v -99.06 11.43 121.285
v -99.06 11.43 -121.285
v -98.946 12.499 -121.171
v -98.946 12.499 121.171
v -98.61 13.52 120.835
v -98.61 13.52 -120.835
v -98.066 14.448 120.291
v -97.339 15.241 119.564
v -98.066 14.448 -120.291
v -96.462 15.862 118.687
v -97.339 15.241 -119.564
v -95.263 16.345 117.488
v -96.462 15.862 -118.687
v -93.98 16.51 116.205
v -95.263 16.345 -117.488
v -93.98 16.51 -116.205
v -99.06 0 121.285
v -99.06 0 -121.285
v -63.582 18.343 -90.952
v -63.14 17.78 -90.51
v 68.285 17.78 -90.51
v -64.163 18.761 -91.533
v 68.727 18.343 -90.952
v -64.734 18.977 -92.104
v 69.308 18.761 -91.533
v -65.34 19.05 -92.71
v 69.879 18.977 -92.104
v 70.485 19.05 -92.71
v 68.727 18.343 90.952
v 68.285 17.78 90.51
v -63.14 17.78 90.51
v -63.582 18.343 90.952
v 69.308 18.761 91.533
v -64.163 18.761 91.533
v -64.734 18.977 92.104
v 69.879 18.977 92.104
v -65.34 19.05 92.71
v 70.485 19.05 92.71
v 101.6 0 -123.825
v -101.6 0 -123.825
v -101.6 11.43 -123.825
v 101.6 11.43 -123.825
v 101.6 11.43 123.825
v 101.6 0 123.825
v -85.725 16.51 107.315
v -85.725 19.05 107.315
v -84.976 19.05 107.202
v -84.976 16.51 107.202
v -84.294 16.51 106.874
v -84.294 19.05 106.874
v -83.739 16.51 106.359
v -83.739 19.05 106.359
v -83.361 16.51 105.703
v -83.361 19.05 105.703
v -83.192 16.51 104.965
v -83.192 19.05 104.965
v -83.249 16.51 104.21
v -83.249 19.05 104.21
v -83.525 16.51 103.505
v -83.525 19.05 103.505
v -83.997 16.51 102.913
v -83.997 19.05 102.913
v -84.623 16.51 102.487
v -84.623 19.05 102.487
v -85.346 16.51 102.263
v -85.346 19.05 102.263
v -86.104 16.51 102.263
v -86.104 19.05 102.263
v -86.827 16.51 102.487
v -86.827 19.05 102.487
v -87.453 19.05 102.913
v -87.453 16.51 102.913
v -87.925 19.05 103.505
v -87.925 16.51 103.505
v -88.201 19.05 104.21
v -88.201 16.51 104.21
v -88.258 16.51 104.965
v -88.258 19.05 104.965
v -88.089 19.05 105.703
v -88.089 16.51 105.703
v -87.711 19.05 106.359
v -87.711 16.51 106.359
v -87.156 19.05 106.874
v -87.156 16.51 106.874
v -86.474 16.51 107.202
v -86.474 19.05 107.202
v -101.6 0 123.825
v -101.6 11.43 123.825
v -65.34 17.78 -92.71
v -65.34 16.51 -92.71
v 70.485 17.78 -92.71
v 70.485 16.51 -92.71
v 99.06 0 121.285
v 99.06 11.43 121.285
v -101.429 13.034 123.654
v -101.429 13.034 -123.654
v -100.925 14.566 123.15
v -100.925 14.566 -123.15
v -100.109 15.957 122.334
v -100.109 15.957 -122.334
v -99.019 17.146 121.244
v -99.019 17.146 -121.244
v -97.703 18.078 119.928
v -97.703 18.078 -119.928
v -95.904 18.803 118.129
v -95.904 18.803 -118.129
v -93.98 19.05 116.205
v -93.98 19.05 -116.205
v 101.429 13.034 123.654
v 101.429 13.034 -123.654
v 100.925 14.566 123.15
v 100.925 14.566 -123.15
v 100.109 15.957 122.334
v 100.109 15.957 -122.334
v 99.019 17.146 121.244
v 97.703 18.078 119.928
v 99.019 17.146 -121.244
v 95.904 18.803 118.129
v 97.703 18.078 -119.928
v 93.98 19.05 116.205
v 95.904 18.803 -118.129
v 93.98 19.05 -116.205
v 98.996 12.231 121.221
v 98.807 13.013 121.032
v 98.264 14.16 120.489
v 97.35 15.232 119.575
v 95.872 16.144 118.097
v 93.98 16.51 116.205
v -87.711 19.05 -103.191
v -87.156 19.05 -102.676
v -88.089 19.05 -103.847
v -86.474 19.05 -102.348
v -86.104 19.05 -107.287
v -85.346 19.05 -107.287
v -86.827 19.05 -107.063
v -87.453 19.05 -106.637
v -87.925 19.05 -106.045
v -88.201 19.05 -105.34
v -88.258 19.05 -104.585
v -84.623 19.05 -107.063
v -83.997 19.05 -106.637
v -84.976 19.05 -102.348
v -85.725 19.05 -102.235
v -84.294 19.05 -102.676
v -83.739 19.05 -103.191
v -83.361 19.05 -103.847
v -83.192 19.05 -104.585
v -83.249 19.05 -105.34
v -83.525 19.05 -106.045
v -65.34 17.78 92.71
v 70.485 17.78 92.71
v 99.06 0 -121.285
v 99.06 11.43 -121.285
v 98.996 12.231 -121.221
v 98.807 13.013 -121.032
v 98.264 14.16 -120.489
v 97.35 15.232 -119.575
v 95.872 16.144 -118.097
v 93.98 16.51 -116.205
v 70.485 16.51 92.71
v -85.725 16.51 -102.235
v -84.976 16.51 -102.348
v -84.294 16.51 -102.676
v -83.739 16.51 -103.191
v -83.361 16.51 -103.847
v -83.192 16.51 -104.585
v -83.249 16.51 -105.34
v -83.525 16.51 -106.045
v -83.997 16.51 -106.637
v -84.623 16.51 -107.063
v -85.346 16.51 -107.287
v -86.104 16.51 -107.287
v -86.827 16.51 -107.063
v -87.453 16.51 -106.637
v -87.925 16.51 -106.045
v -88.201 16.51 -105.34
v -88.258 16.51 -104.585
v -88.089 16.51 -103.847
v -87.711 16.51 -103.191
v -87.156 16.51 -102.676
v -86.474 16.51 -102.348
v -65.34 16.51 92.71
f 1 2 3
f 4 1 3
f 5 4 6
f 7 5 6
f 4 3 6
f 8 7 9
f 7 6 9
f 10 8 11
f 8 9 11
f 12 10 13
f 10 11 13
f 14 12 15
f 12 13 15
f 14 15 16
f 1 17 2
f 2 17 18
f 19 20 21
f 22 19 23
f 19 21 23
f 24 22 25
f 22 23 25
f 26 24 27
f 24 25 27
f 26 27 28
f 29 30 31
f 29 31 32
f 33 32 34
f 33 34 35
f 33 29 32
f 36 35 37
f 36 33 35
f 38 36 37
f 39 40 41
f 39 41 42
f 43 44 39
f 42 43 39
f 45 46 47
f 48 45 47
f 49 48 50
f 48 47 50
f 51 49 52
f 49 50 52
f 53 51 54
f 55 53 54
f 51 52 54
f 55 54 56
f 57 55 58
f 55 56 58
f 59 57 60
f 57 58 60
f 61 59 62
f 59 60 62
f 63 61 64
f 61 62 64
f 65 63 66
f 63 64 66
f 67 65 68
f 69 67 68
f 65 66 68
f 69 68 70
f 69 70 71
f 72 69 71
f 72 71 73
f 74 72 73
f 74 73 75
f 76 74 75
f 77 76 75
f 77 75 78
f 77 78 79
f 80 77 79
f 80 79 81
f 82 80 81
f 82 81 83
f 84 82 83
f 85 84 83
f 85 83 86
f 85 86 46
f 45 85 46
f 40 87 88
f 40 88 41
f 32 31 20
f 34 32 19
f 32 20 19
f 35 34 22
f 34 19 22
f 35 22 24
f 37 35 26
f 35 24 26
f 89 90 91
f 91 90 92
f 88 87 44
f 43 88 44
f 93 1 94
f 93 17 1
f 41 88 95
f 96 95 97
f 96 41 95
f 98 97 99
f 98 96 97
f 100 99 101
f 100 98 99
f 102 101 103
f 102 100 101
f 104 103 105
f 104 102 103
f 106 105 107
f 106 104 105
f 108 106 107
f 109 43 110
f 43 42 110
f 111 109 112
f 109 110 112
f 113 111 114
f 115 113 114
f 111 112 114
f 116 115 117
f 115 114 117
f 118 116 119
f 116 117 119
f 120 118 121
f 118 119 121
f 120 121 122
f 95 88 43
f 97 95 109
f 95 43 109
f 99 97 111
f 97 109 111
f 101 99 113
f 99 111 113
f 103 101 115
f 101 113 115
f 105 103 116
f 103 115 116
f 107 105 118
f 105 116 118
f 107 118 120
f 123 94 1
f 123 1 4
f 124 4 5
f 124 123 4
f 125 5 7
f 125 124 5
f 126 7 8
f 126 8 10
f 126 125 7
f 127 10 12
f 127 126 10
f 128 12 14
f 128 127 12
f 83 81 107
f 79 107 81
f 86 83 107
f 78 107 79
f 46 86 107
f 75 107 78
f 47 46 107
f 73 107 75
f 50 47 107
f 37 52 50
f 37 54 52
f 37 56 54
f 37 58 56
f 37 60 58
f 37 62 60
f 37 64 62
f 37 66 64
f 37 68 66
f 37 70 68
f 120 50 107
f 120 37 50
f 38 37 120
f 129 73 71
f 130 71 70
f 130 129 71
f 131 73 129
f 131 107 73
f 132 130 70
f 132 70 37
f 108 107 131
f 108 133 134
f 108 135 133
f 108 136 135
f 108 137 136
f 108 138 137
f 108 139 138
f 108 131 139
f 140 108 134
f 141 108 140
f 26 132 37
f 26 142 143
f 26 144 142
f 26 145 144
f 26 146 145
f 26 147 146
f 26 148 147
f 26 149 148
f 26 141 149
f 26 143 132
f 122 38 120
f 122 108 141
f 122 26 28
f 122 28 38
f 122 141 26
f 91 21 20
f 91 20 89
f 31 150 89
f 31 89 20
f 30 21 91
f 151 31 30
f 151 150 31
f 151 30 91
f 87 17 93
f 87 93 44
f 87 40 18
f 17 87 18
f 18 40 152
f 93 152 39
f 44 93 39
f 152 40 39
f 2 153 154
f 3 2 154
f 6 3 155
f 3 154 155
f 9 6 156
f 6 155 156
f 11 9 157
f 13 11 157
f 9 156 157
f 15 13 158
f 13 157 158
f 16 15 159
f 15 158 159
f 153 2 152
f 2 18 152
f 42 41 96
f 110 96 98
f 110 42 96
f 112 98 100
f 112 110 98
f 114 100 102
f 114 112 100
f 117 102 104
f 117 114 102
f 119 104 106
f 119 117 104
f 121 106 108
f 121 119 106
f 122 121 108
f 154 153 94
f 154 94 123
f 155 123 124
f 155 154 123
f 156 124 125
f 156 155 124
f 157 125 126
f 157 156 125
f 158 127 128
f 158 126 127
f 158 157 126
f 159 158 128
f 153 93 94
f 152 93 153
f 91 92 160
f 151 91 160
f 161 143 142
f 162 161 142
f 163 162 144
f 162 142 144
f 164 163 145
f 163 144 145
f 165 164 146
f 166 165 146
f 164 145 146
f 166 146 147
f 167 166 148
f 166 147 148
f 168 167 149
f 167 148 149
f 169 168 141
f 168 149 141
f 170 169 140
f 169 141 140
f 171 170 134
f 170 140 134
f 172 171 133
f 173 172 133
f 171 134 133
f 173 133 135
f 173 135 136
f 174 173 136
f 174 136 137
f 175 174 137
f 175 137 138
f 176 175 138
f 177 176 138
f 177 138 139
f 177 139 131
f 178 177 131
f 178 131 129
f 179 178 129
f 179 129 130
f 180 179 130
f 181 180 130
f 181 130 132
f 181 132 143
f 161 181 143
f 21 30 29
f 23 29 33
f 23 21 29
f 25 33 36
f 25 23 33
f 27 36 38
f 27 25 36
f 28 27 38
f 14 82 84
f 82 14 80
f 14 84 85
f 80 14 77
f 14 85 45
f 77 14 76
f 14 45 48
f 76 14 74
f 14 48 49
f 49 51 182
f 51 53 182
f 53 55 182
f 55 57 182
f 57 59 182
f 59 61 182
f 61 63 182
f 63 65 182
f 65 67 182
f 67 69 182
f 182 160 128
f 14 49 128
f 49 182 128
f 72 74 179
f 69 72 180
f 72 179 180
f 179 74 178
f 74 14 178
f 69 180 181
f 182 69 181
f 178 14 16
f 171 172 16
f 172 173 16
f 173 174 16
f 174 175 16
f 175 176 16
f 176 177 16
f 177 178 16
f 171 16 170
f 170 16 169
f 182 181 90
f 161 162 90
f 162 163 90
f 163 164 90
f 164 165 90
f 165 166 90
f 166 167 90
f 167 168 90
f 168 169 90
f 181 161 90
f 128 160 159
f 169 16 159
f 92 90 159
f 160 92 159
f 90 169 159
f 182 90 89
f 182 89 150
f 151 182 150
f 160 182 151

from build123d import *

# Parameters (mm, degrees)
SKETCH1_W           = 203.2
SKETCH1_H           = 247.65
BOSS_EXTRUDE1_DEPTH = 19.05
FILLET1_R           = 7.62
SHELL1_T            = -2.54
CUT_EXTRUDE1_REACH  = 163.301
SKETCH2_W           = 130.745
SKETCH2_H           = 180.34
FILLET2_R           = 2.54
CUT_EXTRUDE2_REACH  = 163.301
SKETCH3_R           = 2.54
SKETCH4_W           = 135.825
SKETCH4_H           = 185.42
CUT_EXTRUDE3_DEPTH  = 1.27


with BuildPart() as part:
    # Sketch1 → Boss-Extrude1 (new body)
    with BuildSketch(Plane(origin=(0, 0, 0), x_dir=(1, 0, 0), z_dir=(0, 1, 0))):
        Rectangle(SKETCH1_W, SKETCH1_H)
    extrude(amount=BOSS_EXTRUDE1_DEPTH)

    # Fillet1
    fillet1_edges = [part.edges().sort_by_distance(p)[0] for p in [
        (-101.6, 19.05, 0),
        (0, 19.05, 123.825),
        (101.6, 19.05, 0),
        (0, 19.05, -123.825),
    ]]
    fillet(fillet1_edges, radius=FILLET1_R)

    # Shell1
    shell1_openings = [part.faces().sort_by_distance(p)[0] for p in [
        (0, 0, 0),
    ]]
    offset(amount=SHELL1_T, openings=shell1_openings)

    # Sketch2 → Cut-Extrude1 (cut, up to next)
    with BuildSketch(Plane(origin=(0, 19.05, 0), x_dir=(1, 0, 0), z_dir=(0, 1, 0)), mode=Mode.PRIVATE) as cut_extrude1_sk1:
        with Locations((2.5725, 0)):
            Rectangle(SKETCH2_W, SKETCH2_H)
    cut_extrude1_tool1 = extrude(cut_extrude1_sk1.sketch, amount=-CUT_EXTRUDE1_REACH, mode=Mode.PRIVATE) & part.part
    add(cut_extrude1_tool1.solids().sort_by_distance((2.5725, 19.05, 0))[0], mode=Mode.SUBTRACT)

    # Fillet2
    fillet2_edges = [part.edges().sort_by_distance(p)[0] for p in [
        (-62.8, 19.05, 0),
        (2.5725, 19.05, 90.17),
        (67.945, 19.05, 0),
        (2.5725, 19.05, -90.17),
    ]]
    fillet(fillet2_edges, radius=FILLET2_R - 0.0001)  # a hair under: the kernel refuses the full size

    # Sketch3 → Cut-Extrude2 (cut, up to next)
    with BuildSketch(Plane(origin=(0, 19.05, 0), x_dir=(1, 0, 0), z_dir=(0, 1, 0)), mode=Mode.PRIVATE) as cut_extrude2_sk1:
        with Locations(Location((-85.725, 104.775, 0), (0, 0, 270))):
            Circle(SKETCH3_R)
    cut_extrude2_tool1 = extrude(cut_extrude2_sk1.sketch, amount=-CUT_EXTRUDE2_REACH, mode=Mode.PRIVATE) & part.part
    # Sketch3 → Cut-Extrude2 (cut, up to next)
    with BuildSketch(Plane(origin=(0, 19.05, 0), x_dir=(1, 0, 0), z_dir=(0, 1, 0)), mode=Mode.PRIVATE) as cut_extrude2_sk2:
        with Locations(Location((-85.725, -104.775, 0), (0, 0, 270))):
            Circle(SKETCH3_R)
    cut_extrude2_tool2 = extrude(cut_extrude2_sk2.sketch, amount=-CUT_EXTRUDE2_REACH, mode=Mode.PRIVATE) & part.part
    add(cut_extrude2_tool1.solids().sort_by_distance((-85.725, 19.05, -104.775))[0], mode=Mode.SUBTRACT)
    add(cut_extrude2_tool2.solids().sort_by_distance((-85.725, 19.05, 104.775))[0], mode=Mode.SUBTRACT)

    # Sketch4 → Cut-Extrude3 (cut)
    with BuildSketch(Plane.XZ.offset(-16.51)):
        with Locations((2.5725, 0)):
            Rectangle(SKETCH4_W, SKETCH4_H)
    extrude(amount=-CUT_EXTRUDE3_DEPTH, mode=Mode.SUBTRACT)


solid = part.part
